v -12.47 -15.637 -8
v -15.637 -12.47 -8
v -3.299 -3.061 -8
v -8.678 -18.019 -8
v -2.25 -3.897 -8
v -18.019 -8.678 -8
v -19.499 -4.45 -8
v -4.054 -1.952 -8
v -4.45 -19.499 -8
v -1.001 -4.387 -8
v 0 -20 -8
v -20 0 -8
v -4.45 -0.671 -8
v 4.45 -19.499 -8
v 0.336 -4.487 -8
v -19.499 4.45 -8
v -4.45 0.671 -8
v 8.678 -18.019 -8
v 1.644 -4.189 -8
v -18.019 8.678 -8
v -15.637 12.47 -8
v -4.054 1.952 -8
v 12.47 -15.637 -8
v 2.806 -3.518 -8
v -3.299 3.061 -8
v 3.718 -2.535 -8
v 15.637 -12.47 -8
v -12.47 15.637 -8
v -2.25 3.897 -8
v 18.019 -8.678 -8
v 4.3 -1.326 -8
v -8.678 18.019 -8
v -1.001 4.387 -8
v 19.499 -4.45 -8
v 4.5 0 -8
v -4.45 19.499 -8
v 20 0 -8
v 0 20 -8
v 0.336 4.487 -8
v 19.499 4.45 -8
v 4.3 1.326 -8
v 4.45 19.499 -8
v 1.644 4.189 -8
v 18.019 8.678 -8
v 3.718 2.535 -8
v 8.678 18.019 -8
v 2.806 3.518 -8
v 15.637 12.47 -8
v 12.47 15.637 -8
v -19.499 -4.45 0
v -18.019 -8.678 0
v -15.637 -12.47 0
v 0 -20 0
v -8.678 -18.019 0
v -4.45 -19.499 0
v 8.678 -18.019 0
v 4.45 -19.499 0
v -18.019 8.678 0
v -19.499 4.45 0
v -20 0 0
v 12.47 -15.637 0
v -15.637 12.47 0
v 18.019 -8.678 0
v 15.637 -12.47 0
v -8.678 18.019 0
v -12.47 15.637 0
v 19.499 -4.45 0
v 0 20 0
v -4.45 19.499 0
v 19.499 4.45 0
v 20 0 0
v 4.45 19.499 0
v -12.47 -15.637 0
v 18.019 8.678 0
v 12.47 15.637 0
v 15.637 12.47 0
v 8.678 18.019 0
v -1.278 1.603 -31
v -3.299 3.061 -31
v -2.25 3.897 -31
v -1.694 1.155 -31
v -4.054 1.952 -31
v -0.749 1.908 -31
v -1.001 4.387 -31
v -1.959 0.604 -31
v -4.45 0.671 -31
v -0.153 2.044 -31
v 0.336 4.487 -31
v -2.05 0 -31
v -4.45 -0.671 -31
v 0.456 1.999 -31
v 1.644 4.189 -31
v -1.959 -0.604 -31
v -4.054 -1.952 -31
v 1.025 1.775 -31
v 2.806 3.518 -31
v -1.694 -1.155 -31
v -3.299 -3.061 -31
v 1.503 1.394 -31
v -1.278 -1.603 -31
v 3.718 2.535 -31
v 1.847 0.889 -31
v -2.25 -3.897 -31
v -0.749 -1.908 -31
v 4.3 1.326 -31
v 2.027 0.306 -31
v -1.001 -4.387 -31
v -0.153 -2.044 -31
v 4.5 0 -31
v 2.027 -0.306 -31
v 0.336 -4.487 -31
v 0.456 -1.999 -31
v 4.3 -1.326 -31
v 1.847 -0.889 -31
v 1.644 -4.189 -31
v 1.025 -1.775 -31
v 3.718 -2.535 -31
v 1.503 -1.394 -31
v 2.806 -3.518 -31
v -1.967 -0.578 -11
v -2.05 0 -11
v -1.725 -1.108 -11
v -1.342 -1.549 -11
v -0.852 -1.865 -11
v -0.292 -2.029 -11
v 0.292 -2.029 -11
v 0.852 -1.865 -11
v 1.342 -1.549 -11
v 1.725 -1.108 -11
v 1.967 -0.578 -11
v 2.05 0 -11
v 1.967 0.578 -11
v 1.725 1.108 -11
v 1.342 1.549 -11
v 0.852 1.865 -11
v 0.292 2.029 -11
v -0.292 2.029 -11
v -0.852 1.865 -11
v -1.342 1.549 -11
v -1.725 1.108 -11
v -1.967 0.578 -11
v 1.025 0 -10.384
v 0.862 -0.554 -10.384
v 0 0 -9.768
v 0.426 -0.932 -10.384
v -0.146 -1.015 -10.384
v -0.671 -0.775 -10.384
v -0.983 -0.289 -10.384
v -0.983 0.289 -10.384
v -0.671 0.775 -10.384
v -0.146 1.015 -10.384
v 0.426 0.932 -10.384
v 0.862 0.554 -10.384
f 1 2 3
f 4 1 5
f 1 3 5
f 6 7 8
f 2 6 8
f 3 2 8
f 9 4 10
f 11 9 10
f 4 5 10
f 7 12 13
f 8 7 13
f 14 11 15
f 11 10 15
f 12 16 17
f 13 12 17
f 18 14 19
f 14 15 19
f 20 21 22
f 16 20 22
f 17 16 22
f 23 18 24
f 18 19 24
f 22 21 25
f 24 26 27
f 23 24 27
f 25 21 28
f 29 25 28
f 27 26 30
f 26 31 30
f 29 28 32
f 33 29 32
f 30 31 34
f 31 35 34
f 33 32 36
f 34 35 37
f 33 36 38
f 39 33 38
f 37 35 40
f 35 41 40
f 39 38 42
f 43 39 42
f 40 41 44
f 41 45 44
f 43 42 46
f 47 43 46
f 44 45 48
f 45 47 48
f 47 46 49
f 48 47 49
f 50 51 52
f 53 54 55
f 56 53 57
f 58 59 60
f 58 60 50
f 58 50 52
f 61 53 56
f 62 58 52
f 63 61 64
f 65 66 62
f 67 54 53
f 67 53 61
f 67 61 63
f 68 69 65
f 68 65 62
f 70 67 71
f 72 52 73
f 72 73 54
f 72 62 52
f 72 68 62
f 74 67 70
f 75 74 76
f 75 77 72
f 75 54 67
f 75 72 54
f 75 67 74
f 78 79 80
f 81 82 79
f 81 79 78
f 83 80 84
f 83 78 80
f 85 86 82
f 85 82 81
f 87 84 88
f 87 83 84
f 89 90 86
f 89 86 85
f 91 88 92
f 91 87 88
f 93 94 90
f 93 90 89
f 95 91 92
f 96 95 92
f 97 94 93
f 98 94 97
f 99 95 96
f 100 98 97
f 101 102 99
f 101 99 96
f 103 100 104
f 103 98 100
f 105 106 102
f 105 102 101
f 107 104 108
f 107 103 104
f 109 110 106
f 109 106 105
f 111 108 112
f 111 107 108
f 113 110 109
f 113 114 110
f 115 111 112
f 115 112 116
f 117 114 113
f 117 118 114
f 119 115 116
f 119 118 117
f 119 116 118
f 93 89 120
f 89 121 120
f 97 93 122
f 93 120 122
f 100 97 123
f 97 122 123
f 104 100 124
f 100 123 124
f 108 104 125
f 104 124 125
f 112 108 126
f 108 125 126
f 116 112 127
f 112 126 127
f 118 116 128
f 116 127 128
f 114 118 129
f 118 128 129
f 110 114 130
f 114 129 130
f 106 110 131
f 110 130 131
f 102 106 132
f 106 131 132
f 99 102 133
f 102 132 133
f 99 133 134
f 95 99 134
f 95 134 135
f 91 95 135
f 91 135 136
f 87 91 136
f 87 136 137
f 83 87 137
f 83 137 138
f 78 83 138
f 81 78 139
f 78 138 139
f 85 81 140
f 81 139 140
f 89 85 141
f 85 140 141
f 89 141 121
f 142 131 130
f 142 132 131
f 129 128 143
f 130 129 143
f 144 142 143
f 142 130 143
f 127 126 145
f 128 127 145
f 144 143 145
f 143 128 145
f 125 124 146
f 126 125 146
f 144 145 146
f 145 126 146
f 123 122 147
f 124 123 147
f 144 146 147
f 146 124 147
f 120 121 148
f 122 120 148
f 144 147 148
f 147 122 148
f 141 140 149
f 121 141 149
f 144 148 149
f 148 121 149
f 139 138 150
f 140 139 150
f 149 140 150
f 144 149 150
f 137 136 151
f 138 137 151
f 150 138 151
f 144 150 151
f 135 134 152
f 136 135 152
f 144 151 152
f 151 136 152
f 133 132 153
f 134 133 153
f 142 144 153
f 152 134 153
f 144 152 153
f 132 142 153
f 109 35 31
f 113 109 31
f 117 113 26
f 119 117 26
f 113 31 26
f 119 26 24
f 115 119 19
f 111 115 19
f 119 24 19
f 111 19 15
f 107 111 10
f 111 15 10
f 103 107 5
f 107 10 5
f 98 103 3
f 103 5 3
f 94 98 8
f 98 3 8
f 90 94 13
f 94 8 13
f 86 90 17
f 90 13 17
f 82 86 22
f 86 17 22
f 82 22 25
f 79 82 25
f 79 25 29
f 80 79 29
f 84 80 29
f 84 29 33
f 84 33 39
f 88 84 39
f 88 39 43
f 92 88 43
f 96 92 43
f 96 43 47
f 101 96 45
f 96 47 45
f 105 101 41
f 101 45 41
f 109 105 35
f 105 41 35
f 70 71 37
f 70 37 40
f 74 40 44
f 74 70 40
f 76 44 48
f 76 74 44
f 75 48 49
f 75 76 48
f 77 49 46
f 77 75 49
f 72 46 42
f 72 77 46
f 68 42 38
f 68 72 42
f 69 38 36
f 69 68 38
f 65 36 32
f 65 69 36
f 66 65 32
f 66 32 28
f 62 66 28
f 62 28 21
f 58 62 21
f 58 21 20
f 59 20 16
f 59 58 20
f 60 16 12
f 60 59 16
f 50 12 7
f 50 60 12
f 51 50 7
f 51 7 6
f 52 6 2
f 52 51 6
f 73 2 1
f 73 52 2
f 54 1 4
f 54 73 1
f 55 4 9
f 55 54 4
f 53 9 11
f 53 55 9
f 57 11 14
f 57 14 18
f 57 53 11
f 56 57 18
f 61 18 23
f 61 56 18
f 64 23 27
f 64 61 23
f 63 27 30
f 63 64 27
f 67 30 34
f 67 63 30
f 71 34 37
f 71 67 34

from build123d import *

# Parameters (mm, degrees)
F0_R     = 20
F1_DEPTH = 8
F2_R     = 4.5
F3_DEPTH = 23
F5_D     = 4.1
F5_DEPTH = 20
F5_TIP   = 1.231764269


with BuildPart() as f1:
    # F0 (on Top) → F1 (new body)
    with BuildSketch(Plane.XY):
        Circle(F0_R)
    extrude(amount=-F1_DEPTH)

    # F2 (on face) → F3 (join)
    with BuildSketch(Plane(origin=(0, 0, -8), x_dir=(1, 0, 0), z_dir=(0, 0, -1))):
        Circle(F2_R)
    extrude(amount=F3_DEPTH)

    # F5
    with Locations(Plane(origin=(0, 0, -31), x_dir=(1, 0, 0), z_dir=(0, 0, -1))):
        with Locations((0, 0)):
            Hole(F5_D / 2, depth=F5_DEPTH)
            with Locations((0, 0, -(F5_DEPTH + F5_TIP / 2))):  # 118° drill point
                Cone(0, F5_D / 2, F5_TIP, mode=Mode.SUBTRACT)


solid = f1.part
